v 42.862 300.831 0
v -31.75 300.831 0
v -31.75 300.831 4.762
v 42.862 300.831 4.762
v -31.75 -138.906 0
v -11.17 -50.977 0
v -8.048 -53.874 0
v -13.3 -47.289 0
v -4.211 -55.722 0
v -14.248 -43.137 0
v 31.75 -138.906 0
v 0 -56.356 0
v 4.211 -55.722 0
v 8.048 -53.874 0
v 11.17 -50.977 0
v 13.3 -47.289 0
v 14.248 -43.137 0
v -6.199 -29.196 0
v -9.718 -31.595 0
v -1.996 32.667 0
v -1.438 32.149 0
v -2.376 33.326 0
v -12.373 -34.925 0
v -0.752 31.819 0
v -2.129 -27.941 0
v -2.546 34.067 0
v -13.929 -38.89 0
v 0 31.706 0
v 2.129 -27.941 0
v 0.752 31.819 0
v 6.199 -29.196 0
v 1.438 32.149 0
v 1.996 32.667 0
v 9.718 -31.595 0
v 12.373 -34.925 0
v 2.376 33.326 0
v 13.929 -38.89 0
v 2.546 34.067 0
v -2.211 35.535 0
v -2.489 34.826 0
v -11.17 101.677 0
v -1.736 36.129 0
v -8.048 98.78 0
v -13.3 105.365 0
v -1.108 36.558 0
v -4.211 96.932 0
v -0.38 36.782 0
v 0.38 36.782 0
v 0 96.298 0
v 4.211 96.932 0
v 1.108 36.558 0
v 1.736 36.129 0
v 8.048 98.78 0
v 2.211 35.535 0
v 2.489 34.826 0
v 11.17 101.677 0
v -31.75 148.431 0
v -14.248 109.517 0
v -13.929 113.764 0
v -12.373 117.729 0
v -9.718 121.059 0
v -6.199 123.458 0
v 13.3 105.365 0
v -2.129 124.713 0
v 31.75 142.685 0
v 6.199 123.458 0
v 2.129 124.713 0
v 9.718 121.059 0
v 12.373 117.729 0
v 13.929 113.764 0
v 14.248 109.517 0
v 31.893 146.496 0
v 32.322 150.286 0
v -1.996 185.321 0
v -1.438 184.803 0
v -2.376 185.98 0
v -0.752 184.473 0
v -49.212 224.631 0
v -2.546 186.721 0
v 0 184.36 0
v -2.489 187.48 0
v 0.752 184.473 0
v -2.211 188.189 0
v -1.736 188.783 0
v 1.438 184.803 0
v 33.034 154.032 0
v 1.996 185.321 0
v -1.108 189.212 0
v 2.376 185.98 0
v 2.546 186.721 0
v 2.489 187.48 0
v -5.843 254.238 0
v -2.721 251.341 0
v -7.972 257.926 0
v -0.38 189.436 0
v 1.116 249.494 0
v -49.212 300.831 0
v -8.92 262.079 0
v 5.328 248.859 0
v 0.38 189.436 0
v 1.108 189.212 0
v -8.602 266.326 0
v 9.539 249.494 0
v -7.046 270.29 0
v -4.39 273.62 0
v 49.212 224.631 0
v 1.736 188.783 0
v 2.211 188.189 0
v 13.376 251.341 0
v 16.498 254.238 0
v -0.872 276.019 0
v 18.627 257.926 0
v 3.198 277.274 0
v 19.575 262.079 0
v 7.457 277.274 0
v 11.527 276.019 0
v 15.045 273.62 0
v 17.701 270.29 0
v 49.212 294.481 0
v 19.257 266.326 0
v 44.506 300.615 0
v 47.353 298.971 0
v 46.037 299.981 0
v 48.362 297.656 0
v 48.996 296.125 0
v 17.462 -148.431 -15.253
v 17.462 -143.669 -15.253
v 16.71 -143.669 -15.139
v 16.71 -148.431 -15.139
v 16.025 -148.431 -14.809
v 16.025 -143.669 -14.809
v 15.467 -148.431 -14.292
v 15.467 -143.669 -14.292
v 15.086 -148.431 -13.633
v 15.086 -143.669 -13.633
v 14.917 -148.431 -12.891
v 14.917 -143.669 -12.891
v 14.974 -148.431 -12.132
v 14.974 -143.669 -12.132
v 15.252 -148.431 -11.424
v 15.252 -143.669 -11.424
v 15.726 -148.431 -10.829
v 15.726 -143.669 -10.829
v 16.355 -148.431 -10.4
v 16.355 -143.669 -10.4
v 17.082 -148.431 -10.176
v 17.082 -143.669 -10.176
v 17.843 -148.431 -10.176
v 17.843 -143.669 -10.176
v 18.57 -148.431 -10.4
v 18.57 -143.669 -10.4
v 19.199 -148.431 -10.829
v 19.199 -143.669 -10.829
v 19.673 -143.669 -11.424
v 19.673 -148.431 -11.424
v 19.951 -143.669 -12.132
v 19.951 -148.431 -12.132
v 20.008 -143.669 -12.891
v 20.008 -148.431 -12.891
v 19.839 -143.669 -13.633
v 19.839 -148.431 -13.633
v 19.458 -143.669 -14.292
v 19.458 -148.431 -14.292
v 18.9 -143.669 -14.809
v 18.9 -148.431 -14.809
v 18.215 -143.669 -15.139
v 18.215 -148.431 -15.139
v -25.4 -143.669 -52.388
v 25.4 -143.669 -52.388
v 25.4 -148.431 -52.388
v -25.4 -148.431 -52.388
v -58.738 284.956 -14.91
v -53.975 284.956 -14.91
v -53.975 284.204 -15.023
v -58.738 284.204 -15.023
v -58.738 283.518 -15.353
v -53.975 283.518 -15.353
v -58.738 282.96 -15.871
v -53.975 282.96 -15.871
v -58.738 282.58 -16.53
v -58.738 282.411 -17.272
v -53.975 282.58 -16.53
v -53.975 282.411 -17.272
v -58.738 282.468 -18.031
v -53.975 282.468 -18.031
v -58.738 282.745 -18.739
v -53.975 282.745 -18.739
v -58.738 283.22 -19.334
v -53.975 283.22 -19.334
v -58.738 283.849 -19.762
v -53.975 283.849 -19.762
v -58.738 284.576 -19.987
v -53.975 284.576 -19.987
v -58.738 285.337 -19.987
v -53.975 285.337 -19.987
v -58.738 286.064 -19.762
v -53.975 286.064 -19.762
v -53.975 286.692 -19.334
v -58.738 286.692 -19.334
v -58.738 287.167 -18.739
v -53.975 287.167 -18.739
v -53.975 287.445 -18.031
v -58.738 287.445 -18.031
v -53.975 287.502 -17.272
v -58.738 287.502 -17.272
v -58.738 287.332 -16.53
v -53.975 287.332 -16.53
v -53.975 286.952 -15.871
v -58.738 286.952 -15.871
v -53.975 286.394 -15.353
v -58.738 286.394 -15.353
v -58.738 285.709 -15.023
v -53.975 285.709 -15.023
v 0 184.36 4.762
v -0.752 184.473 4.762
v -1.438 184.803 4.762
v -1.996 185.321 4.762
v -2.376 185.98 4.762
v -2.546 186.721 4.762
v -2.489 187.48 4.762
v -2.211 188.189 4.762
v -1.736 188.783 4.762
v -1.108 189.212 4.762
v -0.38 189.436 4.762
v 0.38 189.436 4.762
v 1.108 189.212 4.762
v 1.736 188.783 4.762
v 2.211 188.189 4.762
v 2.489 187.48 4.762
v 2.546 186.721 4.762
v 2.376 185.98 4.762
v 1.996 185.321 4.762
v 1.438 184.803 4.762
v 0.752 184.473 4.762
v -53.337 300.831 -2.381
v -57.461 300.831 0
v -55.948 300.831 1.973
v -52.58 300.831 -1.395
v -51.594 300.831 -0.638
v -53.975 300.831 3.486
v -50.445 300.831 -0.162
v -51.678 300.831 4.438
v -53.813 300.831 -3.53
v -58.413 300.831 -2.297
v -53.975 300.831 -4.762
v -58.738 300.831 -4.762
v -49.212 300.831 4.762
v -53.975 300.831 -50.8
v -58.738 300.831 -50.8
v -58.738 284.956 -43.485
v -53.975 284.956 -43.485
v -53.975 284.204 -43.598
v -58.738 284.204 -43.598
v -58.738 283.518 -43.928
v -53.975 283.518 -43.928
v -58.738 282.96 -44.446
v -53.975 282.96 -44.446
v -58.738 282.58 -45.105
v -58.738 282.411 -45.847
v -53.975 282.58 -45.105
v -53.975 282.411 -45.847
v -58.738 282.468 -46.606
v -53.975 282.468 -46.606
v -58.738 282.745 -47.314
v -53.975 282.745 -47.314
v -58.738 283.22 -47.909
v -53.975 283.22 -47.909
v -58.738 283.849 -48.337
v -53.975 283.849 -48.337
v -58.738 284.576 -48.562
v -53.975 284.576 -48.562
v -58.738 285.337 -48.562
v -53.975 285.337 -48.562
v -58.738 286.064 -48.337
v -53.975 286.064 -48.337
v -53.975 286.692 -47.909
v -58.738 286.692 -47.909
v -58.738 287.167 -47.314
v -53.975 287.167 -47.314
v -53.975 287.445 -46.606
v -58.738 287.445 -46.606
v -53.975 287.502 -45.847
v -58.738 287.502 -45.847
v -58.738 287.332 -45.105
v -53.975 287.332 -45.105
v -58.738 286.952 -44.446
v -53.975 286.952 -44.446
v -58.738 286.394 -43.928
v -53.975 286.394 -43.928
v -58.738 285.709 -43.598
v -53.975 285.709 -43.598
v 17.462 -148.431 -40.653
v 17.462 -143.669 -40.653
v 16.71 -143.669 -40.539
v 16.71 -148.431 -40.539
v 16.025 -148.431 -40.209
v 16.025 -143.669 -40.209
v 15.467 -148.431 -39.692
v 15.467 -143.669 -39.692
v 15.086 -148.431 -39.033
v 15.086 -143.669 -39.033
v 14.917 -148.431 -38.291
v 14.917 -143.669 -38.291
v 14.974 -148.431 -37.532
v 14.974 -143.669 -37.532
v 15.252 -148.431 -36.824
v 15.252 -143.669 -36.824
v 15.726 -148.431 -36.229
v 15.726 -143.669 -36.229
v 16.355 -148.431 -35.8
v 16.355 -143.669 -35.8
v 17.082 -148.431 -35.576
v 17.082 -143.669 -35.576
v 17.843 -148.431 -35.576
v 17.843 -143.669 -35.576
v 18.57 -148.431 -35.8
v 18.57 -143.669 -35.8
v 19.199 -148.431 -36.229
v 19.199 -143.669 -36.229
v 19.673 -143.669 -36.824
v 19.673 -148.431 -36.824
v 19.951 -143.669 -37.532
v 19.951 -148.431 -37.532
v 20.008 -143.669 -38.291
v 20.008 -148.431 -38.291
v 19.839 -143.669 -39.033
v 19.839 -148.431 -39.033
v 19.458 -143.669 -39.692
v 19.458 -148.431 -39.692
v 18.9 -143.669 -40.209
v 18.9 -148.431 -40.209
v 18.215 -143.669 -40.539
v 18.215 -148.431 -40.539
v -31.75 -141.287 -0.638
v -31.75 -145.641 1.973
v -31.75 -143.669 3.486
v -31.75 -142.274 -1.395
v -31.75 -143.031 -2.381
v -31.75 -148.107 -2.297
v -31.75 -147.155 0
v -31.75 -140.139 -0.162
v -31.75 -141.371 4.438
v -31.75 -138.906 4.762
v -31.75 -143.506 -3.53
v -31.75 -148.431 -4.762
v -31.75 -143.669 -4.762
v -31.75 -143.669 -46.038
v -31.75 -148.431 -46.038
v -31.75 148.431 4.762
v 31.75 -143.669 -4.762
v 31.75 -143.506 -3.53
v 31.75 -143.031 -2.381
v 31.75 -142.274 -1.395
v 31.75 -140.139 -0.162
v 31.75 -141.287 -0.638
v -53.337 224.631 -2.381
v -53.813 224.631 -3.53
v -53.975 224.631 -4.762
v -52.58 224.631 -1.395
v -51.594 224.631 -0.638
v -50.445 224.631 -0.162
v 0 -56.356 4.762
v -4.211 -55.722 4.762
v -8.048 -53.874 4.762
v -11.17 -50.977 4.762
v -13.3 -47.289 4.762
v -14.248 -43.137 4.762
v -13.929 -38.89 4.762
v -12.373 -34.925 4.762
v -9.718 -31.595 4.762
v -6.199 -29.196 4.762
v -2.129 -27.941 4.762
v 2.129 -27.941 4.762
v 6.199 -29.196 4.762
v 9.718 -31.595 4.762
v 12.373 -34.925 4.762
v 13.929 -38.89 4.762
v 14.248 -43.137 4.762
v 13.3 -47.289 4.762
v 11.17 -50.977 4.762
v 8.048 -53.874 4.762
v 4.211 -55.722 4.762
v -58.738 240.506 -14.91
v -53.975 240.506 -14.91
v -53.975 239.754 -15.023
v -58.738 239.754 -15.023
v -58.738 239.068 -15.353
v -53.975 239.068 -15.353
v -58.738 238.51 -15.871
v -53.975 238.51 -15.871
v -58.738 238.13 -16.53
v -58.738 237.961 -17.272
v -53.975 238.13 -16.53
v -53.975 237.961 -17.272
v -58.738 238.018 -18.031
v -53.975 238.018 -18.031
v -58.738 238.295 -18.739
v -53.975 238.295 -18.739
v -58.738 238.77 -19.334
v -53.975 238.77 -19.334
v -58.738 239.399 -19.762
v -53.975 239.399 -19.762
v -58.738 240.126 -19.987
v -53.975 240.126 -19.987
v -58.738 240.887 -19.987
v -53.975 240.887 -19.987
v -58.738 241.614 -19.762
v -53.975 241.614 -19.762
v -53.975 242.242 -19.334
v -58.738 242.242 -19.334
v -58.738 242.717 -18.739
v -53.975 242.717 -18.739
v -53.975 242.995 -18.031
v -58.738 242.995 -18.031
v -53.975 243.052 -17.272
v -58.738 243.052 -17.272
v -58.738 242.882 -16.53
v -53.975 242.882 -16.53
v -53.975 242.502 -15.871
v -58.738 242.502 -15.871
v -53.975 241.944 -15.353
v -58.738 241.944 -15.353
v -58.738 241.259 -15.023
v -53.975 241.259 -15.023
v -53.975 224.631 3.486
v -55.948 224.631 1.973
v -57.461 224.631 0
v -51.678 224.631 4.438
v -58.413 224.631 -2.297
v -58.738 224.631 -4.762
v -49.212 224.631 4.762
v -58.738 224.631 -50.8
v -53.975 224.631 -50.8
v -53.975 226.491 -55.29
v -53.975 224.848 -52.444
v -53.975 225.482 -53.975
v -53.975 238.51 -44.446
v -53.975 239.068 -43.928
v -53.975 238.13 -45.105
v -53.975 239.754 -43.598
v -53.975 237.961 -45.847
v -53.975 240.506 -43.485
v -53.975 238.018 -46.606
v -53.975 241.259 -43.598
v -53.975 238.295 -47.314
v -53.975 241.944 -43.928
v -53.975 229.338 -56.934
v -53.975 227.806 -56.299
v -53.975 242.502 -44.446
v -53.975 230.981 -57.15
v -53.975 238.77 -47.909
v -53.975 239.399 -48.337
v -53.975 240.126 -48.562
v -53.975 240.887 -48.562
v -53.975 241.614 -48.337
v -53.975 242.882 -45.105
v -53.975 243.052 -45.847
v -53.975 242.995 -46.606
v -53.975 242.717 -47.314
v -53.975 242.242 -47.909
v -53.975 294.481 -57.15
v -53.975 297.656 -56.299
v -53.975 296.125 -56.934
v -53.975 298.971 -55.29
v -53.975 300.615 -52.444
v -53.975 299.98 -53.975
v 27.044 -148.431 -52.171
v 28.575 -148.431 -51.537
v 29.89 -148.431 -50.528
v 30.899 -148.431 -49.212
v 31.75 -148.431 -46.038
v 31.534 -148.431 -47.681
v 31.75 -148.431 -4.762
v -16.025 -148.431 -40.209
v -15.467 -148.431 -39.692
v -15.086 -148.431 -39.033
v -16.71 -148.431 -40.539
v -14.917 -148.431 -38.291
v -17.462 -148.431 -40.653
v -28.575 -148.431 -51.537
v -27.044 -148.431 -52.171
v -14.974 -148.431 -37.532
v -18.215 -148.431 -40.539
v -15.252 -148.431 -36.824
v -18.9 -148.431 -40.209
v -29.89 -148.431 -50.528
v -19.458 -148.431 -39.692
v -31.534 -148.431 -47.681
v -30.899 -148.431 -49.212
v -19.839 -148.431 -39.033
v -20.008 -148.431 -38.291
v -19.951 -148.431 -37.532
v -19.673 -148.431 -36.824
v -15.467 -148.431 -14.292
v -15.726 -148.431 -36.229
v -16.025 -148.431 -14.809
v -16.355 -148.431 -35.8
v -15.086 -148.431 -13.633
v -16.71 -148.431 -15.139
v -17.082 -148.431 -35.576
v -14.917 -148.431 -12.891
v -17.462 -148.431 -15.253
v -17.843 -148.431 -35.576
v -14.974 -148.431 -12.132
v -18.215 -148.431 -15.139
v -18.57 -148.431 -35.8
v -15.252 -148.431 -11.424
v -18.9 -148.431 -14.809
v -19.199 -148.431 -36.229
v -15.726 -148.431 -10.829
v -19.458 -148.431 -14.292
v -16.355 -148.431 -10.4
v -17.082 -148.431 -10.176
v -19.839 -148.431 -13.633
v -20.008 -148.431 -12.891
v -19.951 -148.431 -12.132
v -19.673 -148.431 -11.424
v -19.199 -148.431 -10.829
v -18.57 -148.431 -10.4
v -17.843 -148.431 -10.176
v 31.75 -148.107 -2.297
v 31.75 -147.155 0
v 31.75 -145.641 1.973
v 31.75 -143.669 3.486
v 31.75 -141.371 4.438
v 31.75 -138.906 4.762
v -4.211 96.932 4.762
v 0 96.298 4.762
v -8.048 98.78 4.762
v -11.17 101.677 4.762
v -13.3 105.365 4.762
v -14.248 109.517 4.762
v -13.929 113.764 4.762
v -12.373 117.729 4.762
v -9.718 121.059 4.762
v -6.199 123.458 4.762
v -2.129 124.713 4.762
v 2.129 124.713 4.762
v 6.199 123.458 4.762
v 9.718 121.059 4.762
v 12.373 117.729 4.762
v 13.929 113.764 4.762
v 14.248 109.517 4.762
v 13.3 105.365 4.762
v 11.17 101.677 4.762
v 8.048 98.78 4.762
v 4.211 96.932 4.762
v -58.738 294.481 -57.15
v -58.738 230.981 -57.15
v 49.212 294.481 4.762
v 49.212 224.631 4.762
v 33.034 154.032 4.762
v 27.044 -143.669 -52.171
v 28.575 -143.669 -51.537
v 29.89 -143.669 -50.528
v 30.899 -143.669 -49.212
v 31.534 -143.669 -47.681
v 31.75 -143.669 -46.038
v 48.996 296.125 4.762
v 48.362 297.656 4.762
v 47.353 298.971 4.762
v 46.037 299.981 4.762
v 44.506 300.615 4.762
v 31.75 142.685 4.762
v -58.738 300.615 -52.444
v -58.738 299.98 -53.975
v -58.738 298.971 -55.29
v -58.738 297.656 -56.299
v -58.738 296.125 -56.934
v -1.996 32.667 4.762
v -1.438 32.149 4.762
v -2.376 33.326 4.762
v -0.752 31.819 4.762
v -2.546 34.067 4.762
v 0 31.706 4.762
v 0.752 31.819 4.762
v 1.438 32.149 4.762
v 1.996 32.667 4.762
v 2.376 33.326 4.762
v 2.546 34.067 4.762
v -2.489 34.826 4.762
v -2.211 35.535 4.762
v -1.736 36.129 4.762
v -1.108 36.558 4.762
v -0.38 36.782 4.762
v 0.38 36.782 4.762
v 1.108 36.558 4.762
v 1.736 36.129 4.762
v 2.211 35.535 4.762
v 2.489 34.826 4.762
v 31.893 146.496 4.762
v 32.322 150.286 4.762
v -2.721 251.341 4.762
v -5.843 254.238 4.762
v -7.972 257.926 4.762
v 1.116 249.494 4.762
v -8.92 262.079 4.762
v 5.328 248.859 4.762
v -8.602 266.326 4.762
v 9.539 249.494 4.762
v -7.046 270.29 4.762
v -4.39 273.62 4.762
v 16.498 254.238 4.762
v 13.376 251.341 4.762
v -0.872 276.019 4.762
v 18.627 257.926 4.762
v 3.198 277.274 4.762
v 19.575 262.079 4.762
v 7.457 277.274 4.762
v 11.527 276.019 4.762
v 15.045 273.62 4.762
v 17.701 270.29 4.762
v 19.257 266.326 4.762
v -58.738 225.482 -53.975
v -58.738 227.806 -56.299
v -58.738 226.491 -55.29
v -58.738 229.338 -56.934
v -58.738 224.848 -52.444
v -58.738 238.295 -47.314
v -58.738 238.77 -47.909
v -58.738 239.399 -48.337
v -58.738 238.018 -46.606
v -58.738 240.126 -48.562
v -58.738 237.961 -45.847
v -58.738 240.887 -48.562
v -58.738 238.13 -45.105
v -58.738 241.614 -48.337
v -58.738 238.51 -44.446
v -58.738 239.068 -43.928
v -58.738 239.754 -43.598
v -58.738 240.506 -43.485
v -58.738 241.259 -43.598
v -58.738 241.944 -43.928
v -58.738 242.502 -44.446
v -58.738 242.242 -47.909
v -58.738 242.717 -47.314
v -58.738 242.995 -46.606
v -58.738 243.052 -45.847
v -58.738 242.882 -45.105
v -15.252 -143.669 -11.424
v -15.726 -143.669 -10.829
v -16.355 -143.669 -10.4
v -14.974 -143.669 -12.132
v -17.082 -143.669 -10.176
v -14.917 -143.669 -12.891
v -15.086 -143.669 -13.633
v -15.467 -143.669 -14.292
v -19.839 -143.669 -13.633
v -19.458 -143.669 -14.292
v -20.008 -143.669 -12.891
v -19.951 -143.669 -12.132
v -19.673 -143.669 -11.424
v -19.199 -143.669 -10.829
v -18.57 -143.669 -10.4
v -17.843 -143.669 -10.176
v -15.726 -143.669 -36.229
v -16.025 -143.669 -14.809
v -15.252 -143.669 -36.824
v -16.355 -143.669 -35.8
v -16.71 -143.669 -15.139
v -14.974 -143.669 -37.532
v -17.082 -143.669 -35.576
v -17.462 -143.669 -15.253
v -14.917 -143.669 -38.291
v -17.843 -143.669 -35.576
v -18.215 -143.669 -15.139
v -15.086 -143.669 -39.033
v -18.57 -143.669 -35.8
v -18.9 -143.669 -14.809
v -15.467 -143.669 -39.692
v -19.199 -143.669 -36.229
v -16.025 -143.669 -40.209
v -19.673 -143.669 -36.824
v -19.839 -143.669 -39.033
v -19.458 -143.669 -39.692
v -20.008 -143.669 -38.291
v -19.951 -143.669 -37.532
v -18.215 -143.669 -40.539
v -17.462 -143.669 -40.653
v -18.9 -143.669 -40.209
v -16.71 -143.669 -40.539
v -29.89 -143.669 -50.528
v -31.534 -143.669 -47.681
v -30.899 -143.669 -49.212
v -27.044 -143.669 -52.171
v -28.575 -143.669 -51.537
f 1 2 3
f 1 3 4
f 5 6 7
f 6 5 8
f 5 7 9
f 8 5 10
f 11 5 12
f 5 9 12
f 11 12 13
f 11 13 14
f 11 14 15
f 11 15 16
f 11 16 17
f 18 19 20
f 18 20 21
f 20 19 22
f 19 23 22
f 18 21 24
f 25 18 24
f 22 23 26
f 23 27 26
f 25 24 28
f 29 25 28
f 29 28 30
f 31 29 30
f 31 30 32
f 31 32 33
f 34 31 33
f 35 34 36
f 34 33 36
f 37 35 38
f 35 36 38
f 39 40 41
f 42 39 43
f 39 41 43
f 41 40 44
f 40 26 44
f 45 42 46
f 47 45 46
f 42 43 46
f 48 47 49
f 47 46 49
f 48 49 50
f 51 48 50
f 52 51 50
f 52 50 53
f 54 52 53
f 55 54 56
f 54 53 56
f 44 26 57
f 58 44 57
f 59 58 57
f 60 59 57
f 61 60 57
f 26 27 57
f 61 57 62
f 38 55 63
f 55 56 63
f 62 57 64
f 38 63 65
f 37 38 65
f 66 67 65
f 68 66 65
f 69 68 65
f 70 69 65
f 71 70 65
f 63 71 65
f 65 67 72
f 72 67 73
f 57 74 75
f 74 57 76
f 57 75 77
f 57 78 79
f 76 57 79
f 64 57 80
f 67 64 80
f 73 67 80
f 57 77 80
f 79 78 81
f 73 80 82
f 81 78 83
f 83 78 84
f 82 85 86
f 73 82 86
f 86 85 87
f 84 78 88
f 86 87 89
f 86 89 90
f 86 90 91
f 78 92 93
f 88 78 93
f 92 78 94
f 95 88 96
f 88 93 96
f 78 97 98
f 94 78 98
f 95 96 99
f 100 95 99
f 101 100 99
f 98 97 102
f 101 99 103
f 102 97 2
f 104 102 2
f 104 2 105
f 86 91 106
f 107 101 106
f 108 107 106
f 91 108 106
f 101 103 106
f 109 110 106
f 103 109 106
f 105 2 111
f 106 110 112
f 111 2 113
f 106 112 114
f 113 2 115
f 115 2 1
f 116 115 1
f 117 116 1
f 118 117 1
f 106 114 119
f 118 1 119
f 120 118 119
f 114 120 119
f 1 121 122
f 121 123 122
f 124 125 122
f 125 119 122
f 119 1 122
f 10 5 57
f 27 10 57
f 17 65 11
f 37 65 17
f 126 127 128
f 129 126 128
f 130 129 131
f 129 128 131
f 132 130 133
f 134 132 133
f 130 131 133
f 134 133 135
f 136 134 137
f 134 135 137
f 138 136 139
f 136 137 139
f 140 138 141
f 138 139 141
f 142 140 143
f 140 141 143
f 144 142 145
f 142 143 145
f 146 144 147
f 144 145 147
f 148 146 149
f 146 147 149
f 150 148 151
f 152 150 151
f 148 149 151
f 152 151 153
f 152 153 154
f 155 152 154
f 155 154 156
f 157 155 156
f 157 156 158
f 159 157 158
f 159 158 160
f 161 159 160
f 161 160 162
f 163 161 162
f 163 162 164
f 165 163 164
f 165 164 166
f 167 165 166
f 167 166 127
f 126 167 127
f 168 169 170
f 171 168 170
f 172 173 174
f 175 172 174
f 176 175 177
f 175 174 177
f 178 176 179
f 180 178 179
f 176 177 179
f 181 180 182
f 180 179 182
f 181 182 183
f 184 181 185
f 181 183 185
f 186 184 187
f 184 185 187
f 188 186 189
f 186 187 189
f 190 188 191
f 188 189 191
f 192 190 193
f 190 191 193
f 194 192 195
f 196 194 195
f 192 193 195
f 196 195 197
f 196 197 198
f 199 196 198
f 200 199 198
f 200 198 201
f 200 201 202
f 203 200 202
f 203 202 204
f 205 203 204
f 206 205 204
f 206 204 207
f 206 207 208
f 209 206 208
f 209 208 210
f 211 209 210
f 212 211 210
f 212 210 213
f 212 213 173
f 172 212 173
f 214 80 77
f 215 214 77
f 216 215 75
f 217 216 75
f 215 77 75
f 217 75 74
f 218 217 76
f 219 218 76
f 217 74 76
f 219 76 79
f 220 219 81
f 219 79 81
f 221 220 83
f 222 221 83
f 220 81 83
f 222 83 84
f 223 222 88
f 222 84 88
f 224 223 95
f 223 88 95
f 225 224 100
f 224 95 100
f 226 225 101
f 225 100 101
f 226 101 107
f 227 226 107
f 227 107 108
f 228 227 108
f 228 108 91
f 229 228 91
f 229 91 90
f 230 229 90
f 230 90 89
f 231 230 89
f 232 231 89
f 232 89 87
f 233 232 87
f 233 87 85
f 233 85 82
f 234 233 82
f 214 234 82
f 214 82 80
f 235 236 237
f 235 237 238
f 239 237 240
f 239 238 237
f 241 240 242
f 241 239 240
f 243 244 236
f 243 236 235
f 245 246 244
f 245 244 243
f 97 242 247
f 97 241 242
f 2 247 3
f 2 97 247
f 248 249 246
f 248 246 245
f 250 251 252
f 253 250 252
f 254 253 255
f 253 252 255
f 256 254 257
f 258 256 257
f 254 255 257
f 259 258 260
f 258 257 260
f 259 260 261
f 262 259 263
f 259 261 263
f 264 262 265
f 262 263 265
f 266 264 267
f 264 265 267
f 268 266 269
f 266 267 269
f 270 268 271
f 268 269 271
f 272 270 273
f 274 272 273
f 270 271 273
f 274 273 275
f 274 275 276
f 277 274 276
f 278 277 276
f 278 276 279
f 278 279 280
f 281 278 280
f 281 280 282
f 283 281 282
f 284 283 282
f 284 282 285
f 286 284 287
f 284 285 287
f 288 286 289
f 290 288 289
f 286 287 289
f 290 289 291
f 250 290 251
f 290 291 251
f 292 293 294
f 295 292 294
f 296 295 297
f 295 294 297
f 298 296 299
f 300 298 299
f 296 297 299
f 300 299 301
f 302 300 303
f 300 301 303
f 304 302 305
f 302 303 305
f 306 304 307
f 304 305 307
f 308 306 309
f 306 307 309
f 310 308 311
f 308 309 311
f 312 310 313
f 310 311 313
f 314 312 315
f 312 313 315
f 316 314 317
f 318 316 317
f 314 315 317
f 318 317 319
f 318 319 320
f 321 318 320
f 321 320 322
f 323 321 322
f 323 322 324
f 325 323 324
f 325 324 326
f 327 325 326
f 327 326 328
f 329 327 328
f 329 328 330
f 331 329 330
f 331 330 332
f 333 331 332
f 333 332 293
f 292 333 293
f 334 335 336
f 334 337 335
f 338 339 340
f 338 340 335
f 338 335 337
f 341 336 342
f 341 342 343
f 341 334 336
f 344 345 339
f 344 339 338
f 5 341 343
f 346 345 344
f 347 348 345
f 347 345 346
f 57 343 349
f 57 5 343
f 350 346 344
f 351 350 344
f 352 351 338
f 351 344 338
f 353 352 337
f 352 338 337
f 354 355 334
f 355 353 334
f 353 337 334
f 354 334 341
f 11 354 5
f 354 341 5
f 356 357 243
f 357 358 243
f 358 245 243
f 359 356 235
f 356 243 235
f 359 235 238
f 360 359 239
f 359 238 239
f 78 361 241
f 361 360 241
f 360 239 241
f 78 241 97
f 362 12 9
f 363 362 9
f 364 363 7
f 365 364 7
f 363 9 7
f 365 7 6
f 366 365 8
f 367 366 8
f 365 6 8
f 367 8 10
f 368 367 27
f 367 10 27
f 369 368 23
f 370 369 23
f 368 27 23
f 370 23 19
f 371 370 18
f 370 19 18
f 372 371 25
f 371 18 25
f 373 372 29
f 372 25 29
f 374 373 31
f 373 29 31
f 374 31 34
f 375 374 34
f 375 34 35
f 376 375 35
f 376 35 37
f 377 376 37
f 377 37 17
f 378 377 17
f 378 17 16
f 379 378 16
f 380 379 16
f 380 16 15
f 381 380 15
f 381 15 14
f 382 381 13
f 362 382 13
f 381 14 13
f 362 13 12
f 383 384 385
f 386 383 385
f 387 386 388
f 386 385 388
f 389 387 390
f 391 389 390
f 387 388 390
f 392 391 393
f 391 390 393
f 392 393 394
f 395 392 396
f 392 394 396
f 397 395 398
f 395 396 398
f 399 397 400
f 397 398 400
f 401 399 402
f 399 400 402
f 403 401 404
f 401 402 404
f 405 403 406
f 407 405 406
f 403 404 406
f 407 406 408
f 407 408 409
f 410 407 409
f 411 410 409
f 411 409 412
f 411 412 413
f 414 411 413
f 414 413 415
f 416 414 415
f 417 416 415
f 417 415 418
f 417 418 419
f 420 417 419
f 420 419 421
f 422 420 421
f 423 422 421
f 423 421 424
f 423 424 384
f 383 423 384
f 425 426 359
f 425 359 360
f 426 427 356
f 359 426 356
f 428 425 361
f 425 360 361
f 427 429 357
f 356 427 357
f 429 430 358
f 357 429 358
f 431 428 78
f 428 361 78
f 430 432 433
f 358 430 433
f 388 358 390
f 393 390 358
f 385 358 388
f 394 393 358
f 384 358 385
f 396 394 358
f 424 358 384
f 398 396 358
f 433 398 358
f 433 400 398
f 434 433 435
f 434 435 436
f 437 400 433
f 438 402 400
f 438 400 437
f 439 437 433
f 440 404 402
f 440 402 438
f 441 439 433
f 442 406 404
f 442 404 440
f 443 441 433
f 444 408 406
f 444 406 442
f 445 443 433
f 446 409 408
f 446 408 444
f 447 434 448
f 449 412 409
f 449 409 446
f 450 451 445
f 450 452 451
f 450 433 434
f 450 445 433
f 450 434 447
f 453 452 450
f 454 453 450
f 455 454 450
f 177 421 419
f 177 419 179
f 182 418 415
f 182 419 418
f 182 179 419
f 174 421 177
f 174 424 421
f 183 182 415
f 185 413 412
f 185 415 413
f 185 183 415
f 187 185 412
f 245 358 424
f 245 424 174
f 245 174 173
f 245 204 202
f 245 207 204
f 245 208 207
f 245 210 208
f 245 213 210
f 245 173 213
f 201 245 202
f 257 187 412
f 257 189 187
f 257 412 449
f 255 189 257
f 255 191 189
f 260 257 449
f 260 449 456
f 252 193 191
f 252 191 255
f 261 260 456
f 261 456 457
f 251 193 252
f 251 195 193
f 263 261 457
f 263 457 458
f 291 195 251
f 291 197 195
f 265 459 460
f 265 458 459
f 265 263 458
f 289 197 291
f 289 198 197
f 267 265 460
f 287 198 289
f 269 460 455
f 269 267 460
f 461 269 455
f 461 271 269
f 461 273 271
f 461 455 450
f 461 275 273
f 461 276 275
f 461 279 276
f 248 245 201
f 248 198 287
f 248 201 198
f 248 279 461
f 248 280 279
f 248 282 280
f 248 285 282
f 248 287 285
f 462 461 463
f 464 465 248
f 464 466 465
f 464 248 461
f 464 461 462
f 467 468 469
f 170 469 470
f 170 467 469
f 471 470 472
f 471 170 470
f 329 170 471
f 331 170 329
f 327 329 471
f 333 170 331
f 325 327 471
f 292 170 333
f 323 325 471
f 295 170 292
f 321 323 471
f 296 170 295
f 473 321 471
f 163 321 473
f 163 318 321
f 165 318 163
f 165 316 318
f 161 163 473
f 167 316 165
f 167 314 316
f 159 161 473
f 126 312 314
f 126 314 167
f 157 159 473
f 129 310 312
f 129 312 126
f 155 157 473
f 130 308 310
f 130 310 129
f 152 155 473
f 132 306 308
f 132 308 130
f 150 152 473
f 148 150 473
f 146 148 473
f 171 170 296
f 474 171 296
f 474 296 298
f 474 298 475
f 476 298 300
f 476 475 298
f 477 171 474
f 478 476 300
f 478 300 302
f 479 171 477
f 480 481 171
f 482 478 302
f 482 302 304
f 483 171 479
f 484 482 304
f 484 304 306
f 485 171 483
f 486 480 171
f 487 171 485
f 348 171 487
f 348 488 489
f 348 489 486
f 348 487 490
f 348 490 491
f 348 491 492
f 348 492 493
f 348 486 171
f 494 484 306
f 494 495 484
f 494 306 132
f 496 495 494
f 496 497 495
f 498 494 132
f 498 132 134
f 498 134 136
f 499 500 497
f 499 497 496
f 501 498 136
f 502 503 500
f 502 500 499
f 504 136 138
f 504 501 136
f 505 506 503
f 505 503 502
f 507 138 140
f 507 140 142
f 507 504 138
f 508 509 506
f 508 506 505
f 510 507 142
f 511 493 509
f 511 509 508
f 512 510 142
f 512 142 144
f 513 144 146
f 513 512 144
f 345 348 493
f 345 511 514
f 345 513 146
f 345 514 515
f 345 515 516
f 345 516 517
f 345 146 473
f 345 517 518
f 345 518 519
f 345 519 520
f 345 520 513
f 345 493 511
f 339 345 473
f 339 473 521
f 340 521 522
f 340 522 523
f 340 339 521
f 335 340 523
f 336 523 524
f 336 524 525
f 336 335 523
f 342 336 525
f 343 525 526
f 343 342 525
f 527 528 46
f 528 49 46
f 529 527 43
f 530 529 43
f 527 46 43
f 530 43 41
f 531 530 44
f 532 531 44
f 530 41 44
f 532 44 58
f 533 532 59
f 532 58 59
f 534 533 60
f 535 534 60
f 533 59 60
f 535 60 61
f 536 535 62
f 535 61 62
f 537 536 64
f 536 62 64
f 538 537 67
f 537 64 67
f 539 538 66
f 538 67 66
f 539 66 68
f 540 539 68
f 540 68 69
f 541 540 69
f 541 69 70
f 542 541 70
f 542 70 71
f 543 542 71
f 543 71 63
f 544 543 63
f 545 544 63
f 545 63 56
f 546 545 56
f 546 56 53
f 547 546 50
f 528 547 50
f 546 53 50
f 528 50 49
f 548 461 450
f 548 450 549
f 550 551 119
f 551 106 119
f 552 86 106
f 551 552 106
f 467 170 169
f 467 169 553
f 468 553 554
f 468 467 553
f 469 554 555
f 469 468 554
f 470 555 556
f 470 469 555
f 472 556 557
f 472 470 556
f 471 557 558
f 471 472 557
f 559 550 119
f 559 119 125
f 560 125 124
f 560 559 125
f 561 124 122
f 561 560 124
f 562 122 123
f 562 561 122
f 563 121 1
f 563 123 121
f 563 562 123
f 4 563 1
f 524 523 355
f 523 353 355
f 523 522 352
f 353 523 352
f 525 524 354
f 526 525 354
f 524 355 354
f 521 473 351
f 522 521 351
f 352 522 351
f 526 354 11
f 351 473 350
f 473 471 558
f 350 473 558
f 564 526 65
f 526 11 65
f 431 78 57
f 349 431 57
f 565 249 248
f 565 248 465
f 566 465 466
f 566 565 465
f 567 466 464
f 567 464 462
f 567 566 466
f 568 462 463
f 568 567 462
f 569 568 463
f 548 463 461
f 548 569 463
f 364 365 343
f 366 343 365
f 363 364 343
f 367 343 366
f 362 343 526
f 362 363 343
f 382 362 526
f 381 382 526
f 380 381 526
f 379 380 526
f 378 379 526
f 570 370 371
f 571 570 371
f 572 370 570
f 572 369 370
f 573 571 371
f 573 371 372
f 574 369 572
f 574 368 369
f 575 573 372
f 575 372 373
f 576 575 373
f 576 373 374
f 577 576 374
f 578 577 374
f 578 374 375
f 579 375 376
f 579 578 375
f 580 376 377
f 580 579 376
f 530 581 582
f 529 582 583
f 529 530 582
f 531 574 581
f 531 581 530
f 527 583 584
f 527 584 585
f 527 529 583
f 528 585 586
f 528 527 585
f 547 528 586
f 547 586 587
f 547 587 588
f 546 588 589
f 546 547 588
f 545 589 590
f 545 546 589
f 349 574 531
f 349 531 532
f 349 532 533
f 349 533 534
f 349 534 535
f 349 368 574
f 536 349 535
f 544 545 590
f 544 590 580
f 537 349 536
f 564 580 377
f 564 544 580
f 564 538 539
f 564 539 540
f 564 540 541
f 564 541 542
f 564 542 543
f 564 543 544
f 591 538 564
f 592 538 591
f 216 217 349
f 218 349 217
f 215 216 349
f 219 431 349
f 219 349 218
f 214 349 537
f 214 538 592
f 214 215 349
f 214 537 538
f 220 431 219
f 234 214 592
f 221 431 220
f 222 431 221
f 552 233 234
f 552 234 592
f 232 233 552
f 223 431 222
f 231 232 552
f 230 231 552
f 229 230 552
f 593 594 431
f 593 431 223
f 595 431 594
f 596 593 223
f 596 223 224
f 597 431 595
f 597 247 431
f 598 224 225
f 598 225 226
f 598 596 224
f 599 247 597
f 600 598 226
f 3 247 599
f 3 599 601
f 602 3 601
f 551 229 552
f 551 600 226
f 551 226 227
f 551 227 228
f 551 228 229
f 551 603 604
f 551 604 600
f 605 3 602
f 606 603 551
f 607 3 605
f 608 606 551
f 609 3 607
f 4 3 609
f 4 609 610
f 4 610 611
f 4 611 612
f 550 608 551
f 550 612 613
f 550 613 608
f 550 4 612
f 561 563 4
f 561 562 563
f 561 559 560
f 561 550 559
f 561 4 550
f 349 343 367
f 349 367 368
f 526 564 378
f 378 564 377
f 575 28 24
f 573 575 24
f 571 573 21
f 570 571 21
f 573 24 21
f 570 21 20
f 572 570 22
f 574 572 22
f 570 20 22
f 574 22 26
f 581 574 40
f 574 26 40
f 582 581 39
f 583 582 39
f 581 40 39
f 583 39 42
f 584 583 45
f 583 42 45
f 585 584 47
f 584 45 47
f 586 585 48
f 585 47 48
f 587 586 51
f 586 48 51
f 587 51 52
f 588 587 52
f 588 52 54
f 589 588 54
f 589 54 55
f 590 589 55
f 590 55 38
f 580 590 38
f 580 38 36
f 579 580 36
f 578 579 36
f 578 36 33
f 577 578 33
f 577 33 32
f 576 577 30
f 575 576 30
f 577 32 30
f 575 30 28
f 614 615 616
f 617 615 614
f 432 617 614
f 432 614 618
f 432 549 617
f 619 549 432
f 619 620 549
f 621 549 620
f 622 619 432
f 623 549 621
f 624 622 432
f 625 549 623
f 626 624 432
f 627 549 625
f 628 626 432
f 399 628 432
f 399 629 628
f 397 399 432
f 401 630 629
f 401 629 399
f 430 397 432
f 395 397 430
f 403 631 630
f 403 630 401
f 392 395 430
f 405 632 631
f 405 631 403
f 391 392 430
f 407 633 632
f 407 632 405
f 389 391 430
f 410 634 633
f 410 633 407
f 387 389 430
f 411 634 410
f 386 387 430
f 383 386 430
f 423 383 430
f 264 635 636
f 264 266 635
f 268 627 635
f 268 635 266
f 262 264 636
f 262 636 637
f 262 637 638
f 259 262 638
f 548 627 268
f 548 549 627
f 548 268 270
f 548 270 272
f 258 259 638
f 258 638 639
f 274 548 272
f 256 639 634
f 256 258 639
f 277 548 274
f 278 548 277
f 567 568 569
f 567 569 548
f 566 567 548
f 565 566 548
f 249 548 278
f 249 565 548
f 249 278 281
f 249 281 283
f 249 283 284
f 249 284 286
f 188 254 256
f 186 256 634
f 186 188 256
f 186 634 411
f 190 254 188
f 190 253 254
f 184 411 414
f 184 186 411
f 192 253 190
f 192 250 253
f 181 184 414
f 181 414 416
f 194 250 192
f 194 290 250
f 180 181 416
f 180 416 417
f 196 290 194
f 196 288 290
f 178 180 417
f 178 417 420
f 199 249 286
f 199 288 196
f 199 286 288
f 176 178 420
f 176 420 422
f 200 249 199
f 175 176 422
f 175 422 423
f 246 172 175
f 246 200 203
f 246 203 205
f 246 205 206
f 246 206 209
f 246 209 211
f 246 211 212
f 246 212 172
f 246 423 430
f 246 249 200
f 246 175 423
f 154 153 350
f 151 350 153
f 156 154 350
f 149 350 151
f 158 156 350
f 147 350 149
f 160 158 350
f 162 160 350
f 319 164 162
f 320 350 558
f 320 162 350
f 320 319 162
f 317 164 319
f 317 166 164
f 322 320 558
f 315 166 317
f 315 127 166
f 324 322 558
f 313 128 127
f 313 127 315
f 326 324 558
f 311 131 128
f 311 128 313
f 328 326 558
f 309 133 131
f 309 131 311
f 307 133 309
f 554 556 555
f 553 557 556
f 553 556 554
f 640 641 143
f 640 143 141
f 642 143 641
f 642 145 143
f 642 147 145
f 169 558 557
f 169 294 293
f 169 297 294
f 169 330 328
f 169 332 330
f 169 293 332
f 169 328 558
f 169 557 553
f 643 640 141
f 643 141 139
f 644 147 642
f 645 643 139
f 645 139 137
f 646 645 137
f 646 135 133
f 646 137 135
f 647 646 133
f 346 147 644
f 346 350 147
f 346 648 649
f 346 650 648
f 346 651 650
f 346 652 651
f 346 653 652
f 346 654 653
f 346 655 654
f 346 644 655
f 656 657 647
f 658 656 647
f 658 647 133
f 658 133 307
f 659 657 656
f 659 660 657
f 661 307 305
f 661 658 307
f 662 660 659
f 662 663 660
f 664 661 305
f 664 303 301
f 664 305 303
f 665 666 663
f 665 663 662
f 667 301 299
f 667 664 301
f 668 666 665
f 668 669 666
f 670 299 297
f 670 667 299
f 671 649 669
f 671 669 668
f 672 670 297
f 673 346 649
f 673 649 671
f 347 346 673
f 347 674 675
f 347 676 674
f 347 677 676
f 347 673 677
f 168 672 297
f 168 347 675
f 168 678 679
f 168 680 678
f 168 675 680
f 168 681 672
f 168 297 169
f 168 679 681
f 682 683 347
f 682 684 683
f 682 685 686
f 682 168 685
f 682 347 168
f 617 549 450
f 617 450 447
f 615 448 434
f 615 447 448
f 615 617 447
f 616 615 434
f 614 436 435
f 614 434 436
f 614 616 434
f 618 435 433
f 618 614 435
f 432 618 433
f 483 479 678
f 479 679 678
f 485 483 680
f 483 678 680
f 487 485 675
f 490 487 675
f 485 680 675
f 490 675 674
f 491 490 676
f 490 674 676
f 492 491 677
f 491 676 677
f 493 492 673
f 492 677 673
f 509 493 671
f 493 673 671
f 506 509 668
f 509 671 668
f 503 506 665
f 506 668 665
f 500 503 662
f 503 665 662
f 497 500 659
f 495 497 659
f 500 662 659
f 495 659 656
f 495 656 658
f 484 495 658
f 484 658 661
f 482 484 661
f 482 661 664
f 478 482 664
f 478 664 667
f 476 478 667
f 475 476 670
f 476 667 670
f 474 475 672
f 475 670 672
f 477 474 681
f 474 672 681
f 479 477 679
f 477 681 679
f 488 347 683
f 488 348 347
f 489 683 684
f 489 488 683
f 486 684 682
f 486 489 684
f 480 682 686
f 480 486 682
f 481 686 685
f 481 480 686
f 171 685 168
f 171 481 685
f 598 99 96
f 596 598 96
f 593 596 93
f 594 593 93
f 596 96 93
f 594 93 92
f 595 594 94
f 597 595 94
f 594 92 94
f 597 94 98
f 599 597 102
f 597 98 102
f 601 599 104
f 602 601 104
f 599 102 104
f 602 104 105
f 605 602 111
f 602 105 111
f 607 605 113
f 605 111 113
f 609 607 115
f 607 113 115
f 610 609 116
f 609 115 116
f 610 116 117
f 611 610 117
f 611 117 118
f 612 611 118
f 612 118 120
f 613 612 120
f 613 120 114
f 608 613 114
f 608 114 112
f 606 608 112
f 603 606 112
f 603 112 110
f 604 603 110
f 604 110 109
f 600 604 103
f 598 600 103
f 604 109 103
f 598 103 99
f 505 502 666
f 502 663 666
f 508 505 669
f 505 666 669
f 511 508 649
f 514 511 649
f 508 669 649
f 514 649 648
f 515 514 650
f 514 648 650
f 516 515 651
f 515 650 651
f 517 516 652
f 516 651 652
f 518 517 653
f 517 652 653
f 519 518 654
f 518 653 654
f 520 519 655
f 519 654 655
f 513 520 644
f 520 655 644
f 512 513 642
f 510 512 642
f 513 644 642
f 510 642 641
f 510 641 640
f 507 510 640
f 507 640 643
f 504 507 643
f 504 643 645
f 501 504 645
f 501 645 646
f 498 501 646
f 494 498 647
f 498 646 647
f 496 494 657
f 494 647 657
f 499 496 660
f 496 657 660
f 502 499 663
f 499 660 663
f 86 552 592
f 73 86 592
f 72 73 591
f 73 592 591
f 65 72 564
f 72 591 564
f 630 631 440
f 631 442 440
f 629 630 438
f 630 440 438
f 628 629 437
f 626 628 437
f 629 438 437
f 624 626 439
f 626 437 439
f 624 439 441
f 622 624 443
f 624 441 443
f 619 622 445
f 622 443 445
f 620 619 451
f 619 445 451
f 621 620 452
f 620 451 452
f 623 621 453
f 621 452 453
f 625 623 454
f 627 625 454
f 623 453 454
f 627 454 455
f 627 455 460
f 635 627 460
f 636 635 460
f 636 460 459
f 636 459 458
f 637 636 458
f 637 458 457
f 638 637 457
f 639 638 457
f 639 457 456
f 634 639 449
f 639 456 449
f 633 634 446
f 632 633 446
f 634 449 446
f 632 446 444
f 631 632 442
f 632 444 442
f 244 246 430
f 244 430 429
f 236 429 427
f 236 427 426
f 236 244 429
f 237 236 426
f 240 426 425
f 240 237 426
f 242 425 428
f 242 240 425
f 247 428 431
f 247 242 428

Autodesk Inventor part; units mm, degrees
ref_plane "YZ Plane" through (0, 0, 0) normal (1, 0, 0) x (0, 1, 0)
ref_plane "XZ Plane" through (0, 0, 0) normal (0, 1, 0) x (-1, 0, 0)
ref_plane "XY Plane" through (0, 0, 0) normal (0, 0, 1) x (1, 0, 0)
sketch "Sketch1" plane through (0, 0, 0) normal (0, 0, 1) x (1, 0, 0)
  line L0 (31.75, -148.4313) -> (-31.75, -148.4313)
  line L1 (-31.75, -148.4313) -> (-31.75, 148.4313)
  line L2 (-31.75, 148.4313) -> (31.75, 148.4313) construction
  line L3 (31.75, 148.4313) -> (31.75, -148.4313)
  line L4 (31.75, -148.4313) -> (-31.75, 148.4313) construction
  line L5 (-31.75, -148.4313) -> (31.75, 148.4313) construction
  line L6 (31.75, 148.4313) -> (49.2125, 224.6313)
  line L7 (-31.75, 148.4313) -> (-31.75, 300.8312) construction
  line L8 (-31.75, 300.8312) -> (49.2125, 300.8313)
  line L9 (49.2125, 224.6313) -> (49.2125, 300.8313)
  line L10 (-31.75, 300.8312) -> (-49.2125, 300.8312)
  line L11 (-49.2125, 300.8312) -> (-49.2125, 224.6312)
  line L12 (-49.2125, 224.6312) -> (-31.75, 224.6312) construction
  line L13 (-31.75, 224.6312) -> (-31.75, 300.8312) construction
  line L14 (-49.2125, 224.6312) -> (-31.75, 148.4313)
  point P0 (0, 0)
  dimension "d0" = 63.5
  dimension "d1" = 296.8625
  dimension "d2" = 80.9625
  dimension "d3" = 152.4
  dimension "d43" = 76.2
  dimension "d63" = 17.4625
  dimension "d64" = 76.2
extrude "Plate1" add sketch "Sketch1" along normal blind 4.7625
sketch "Sketch2" plane through (0, 0, 4.7625) normal (0, 0, 1) x (1, 0, 0)
  line L0 (31.75, -148.4313) -> (-31.75, -148.4313) construction
  line L1 (-31.75, -148.4313) -> (-31.75, 148.4313) construction
  line L2 (0, 110.5852) -> (5.3275, 263.1463) construction
  line L3 (0, 110.5852) -> (152.654, 110.5852) construction
  point P0 (0, 0)
  point P1 (0, -42.0688)
  point P2 (0, -148.4313)
  point P3 (-31.75, 300.0375)
  dimension "d5" = 106.3625
  dimension "d8" = 152.654
  dimension "d29" = 31.75
  dimension "d98" = 152.654
  dimension "d99" = 88
hole "Hole1" at (0, 110.5852, 4.7625) at (5.3275, 263.1463, 4.7625) at (0, -42.0688, 4.7625) direction (0, 0, -1) diameter 28.575 end through all
sketch "Sketch3" plane through (0, 0, 4.7625) normal (0, 0, 1) x (1, 0, 0)
  circle A0 centre (0, 110.5852) radius 14.2875 construction
  line L0 (0, 110.5852) -> (0, -42.0688) construction
  line L1 (0, 110.5852) -> (0, 263.2392) construction
  circle A1 centre (5.3275, 262.3525) radius 14.2875 projected
  circle A2 centre (0, -42.8625) radius 14.2875 projected
  point P0 (0, 0)
  point P1 (0, 186.9122)
  point P2 (0, 34.2582)
hole "Hole2" at (0, 34.2582, 4.7625) at (0, 186.9122, 4.7625) direction (0, 0, -1) diameter 5.1054 end through all clearance for "Flat Head Machine Screw (82)" size "#10" standard "Ansi Unified Screw Threads"
fillet "Corner Round1" radius 50.8 1 edges at (31.75, 148.4313, 2.3813)
sketch "Sketch5" plane through (-31.75, -143.6687, 4.7625) normal (0, -1, 0) x (1, 0, 0)
  line L0 (63.5, 0) -> (0, 0)
  line L1 (0, 0) -> (0, -57.15)
  line L2 (0, -57.15) -> (63.5, -57.15)
  line L3 (63.5, -57.15) -> (63.5, 0)
edge flange "Flange2" height 52.3875 angle 90 thickness 4.7625 bend radius 4.7625 thickness toward (0, -1, 0) relief tear relief width 4.7625 relief depth 2.3813 edges at (0, -148.4313, 0) wall of the first edge with corners at (31.75, -143.6687, 4.7625) (-31.75, -143.6687, 4.7625) (-31.75, -143.6687, -52.3875) (31.75, -143.6687, -52.3875)
bend "Bend2"
corner "Corner2"
sketch "Sketch7" plane through (-53.975, 300.8312, -4.7625) normal (-1, 0, 0) x (0, -1, 0)
  line L0 (76.2, 0) -> (0, 0)
  line L1 (0, 0) -> (0, -52.3875)
  line L2 (0, -52.3875) -> (76.2, -52.3875)
  line L3 (76.2, -52.3875) -> (76.2, 0)
edge flange "Flange3" height 61.9125 angle 90 thickness 4.7625 bend radius 4.7625 thickness toward (-1, 0, 0) relief tear relief width 4.7625 relief depth 2.3813 edges at (-49.2125, 262.7312, 0) wall of the first edge with corners at (-53.975, 224.6312, -4.7625) (-53.975, 300.8312, -4.7625) (-53.975, 300.8312, -57.15) (-53.975, 224.6312, -57.15)
bend "Bend3"
corner "Corner3"
sketch "Sketch8" plane through (-58.7375, 224.6312, -57.15) normal (-1, 0, 0) x (0, 0, 1)
  line L0 (0, 76.2) -> (52.3875, 76.2) projected
  line L1 (0, 0) -> (0, 76.2) projected
  line L2 (52.3875, 0) -> (52.3875, 76.2) construction
  point P0 (57.15, -224.6312)
  point P1 (39.6875, 60.325)
  point P2 (39.6875, 15.875)
  point P3 (11.1125, 15.875)
  point P4 (11.1125, 60.325)
  dimension "d75" = 44.45
  dimension "d76" = 28.575
  dimension "d77" = 15.875
  dimension "d101" = 12.7
hole "Hole4" at (-58.7375, 284.9562, -17.4625) at (-58.7375, 240.5062, -17.4625) at (-58.7375, 240.5062, -46.0375) at (-58.7375, 284.9562, -46.0375) direction (1, 0, 0) diameter 5.1054 end through all
sketch "Sketch9" plane through (-31.75, -148.4313, -52.3875) normal (0, -1, 0) x (1, 0, 0)
  line L0 (0, 0) -> (0, 47.625) projected
  line L1 (0, 57.15) -> (63.5, 57.15) projected
  line L2 (63.5, 0) -> (0, 0) projected
  point P0 (31.75, 52.3875)
  point P1 (14.2875, 39.6875)
  point P2 (49.2125, 39.6875)
  point P3 (49.2125, 14.2875)
  point P4 (14.2875, 14.2875)
  dimension "d86" = 14.2875
  dimension "d87" = 25.4
  dimension "d88" = 34.925
  dimension "d90" = 14.2875
hole "Hole5" at (-17.4625, -148.4313, -12.7) at (17.4625, -148.4313, -12.7) at (17.4625, -148.4313, -38.1) at (-17.4625, -148.4313, -38.1) direction (0, 1, 0) diameter 5.1054 end through all
fillet "Corner Round2" radius 6.35 5 edges at (-56.3563, 224.6312, -57.15) (-56.3563, 300.8312, -57.15) (-31.75, -146.05, -52.3875) (31.75, -146.05, -52.3875) (49.2125, 300.8313, 2.3813)
equation "\"d18\" = Thickness"
equation "\"d84\" = Thickness"
equation "\"d4\" = Thickness"
equation "\"d44\" = BendReliefWidth"
equation "\"d45\" = BendReliefDepth"
equation "\"d46\" = MinimumRemnant"
equation "\"d47\" = TransitionRadius"
equation "\"d50\" = BendRadius"
equation "\"d51\" = CornerReliefSize"
equation "\"d52\" = GapSize"
equation "\"d53\" = JacobiRadiusSize"
equation "\"d65\" = BendReliefWidth"
equation "\"d66\" = BendReliefDepth"
equation "\"d67\" = MinimumRemnant"
equation "\"d68\" = TransitionRadius"
equation "\"d71\" = BendRadius"
equation "\"d72\" = CornerReliefSize"
equation "\"d73\" = GapSize"
equation "\"d74\" = JacobiRadiusSize"
equation "\"d90\" = d86"
equation "\"BendRadius\" = Thickness"
equation "\"BendReliefWidth\" = Thickness"
equation "\"BendReliefDepth\" = 0.5 * Thickness"
equation "\"CornerReliefSize\" = 4 * Thickness"
equation "\"MinimumRemnant\" = 2 * Thickness"
equation "\"TransitionRadius\" = BendRadius"
equation "\"JacobiRadiusSize\" = BendRadius"
equation "\"GapSize\" = Thickness"
equation "\"Thickness\" = 4.7625"
properties part number "feeder_guide_plate" material "Polycarbonate, Clear"
